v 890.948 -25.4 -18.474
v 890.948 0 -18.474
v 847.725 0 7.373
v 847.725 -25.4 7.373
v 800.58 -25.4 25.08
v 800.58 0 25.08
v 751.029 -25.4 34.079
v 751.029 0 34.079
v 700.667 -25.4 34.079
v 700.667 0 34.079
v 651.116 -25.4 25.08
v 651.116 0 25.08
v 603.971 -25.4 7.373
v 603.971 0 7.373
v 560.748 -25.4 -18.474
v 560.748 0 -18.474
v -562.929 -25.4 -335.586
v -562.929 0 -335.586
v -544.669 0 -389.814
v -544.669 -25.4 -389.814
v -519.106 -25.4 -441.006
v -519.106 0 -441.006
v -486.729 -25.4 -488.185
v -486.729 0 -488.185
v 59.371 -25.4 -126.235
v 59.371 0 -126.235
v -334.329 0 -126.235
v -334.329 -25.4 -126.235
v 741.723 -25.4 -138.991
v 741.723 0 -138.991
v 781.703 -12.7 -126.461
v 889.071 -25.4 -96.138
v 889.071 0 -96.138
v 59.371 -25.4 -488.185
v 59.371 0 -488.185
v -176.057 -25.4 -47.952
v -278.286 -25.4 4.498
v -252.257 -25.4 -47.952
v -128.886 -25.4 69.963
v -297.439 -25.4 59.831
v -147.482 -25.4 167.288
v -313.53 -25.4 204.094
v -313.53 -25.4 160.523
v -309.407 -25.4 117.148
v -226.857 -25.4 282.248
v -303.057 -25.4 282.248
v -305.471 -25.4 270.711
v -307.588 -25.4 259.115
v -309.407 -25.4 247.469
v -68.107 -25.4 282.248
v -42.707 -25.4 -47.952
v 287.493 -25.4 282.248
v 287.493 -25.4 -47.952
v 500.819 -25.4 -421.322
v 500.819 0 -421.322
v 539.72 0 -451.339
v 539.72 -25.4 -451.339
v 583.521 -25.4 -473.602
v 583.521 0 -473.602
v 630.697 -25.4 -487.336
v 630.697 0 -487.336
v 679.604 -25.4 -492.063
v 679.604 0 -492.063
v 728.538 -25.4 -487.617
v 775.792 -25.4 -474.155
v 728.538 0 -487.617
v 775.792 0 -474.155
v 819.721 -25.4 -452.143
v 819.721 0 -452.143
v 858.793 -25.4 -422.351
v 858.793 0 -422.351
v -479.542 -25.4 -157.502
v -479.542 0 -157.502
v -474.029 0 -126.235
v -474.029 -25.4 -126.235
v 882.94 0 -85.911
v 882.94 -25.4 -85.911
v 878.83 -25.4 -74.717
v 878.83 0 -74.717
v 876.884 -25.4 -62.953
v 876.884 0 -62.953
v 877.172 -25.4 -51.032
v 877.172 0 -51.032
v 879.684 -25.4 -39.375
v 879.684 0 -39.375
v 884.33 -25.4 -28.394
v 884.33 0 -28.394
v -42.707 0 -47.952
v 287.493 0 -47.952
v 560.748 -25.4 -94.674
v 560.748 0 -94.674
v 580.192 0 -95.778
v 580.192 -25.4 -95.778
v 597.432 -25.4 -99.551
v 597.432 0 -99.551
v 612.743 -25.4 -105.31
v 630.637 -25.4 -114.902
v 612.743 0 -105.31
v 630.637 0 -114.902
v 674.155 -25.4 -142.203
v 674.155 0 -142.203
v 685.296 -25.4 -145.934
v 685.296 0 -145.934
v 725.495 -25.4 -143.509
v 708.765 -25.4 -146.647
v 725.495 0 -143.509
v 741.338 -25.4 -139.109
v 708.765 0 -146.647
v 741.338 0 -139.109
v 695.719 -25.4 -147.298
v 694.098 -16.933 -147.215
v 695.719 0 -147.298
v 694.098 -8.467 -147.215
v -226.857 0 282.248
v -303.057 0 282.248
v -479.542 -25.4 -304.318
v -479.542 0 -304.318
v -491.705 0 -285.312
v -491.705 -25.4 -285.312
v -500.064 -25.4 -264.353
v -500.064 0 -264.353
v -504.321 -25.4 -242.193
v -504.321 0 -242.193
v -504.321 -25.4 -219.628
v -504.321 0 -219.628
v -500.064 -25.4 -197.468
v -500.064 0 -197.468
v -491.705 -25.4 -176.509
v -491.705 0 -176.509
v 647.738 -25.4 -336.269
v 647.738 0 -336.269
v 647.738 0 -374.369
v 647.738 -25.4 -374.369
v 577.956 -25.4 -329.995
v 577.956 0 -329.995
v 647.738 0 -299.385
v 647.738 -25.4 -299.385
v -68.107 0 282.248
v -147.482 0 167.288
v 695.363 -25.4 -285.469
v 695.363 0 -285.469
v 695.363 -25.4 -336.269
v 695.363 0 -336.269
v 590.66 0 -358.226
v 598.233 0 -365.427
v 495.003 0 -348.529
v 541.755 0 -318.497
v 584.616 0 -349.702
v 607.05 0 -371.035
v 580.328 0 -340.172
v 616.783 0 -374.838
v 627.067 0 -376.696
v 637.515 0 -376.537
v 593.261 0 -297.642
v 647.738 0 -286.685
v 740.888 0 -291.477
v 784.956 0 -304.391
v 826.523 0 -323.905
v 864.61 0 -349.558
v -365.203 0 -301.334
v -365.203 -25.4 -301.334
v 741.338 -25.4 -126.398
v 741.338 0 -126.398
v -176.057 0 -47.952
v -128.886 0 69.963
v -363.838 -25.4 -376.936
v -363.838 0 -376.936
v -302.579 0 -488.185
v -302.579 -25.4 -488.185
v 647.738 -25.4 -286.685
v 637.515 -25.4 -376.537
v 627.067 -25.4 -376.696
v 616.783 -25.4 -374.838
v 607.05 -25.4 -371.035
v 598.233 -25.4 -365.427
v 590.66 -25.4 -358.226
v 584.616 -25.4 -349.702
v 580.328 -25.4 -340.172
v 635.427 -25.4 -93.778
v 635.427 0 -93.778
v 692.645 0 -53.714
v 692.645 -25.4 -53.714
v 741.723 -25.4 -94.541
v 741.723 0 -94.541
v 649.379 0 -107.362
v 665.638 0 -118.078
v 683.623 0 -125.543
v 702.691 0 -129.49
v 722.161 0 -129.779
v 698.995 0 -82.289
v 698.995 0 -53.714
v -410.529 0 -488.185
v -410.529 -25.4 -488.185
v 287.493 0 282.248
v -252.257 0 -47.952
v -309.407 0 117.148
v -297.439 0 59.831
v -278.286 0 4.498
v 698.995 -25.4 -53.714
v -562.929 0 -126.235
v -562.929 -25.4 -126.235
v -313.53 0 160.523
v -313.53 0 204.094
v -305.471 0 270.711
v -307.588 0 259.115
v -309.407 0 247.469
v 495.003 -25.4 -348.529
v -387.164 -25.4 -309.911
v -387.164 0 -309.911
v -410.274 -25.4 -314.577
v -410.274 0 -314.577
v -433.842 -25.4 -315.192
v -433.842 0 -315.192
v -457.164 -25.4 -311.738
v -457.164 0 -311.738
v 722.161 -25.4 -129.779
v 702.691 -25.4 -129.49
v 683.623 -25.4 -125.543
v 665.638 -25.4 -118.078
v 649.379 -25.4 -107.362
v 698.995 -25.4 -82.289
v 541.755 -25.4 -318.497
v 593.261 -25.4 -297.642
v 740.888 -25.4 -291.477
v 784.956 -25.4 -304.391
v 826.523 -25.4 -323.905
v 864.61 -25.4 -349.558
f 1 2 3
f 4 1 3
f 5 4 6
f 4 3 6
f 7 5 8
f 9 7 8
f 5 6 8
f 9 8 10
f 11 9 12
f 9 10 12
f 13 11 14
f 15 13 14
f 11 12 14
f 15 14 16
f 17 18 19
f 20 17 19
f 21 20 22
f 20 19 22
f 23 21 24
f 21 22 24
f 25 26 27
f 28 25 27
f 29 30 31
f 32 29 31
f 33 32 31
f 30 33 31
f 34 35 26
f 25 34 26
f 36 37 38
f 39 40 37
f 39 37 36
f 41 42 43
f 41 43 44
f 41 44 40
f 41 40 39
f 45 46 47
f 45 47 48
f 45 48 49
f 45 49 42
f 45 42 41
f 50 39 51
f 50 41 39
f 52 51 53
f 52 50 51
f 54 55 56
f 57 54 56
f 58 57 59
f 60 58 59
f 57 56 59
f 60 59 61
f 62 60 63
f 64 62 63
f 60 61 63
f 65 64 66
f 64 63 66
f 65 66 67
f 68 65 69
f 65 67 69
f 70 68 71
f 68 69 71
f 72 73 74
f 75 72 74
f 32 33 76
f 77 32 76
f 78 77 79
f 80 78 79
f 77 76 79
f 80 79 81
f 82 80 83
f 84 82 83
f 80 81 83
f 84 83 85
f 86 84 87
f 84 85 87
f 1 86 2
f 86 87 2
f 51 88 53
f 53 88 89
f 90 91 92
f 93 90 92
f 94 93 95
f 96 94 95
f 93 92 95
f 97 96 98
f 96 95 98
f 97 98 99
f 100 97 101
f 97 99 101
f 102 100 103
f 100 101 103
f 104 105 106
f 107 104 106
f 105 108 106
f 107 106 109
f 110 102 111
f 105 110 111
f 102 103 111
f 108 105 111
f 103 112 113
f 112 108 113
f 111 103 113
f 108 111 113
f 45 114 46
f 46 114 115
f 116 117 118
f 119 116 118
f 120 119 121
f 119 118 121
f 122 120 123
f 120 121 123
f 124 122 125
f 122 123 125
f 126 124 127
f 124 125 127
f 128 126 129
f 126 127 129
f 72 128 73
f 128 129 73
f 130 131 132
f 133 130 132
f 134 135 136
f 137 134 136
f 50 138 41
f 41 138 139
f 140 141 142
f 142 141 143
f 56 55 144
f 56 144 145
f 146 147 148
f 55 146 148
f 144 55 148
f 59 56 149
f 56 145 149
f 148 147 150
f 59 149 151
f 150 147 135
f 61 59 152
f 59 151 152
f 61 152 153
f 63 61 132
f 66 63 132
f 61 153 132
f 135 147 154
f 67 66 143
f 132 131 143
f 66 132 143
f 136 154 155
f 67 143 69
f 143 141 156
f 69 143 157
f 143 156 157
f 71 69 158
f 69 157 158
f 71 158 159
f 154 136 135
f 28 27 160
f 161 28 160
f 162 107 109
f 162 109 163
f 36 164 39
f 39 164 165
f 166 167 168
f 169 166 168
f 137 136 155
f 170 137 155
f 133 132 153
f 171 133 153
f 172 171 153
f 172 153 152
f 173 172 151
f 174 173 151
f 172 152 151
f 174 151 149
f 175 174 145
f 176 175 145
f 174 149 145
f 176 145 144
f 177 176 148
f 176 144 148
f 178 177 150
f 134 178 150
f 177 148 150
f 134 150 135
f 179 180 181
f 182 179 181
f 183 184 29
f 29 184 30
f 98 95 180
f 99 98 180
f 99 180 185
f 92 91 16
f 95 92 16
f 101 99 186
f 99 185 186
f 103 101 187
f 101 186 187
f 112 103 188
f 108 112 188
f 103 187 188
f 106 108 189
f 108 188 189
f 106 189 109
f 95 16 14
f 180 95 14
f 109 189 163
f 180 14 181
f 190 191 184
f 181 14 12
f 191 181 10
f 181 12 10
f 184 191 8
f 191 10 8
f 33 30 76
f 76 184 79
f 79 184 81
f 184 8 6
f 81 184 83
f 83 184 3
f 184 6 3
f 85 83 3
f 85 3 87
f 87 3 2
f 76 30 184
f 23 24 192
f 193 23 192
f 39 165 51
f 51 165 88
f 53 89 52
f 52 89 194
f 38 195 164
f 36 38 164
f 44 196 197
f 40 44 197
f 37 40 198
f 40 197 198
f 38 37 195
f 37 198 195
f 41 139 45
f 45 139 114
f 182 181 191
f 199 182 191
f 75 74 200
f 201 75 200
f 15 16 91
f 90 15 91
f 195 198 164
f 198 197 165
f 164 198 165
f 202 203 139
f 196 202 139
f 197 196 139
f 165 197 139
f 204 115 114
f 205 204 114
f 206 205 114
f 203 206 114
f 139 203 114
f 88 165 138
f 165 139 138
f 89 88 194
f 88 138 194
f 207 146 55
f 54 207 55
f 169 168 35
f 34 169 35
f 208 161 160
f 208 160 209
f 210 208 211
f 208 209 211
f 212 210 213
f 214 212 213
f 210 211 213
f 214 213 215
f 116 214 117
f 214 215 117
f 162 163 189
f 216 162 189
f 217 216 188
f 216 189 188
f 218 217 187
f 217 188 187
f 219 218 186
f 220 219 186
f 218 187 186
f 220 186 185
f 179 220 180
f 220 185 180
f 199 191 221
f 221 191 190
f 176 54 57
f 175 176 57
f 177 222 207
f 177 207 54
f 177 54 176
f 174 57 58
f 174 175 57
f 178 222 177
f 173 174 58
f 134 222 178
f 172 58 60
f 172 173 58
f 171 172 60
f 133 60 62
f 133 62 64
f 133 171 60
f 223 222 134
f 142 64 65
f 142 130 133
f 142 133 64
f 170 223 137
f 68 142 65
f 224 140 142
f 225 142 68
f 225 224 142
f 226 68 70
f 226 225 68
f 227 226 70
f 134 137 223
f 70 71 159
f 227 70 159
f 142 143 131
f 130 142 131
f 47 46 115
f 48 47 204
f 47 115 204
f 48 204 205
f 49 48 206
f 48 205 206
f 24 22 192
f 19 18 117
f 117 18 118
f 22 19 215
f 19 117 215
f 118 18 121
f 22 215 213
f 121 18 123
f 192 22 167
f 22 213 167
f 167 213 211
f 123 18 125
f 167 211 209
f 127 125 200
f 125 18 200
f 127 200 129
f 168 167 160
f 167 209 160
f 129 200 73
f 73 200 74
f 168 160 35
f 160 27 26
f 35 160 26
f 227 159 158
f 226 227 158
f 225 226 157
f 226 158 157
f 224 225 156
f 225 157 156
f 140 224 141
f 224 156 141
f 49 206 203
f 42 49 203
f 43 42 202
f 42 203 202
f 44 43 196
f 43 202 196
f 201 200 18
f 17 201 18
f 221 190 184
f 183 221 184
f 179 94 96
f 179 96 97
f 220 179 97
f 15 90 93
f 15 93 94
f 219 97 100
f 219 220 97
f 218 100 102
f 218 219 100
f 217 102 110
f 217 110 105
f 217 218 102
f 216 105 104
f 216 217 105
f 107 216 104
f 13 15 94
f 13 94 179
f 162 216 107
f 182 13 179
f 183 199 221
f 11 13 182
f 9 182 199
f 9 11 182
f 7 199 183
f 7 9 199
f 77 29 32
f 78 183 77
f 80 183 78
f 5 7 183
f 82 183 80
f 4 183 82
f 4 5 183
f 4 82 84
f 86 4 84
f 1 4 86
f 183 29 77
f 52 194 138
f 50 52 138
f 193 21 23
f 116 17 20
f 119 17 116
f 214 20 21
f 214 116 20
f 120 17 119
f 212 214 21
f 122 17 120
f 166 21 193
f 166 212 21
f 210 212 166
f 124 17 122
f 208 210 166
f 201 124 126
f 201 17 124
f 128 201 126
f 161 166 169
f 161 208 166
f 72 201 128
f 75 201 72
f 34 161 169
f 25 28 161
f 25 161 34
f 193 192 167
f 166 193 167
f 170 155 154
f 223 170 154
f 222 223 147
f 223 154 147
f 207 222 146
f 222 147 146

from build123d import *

# Parameters (mm, degrees)
F1_DEPTH = 25.4
F3_DEPTH = 25.4
F5_DEPTH = 25.4
F7_DEPTH = 25.4


with BuildPart() as f1:
    # F0 (on Front) → F1 (new body)
    with BuildSketch(Plane.XZ):
        with BuildLine():
            Line((-226.8574877262, 282.2478941011), (-303.0574877262, 282.2478941011))
            ThreePointArc((-303.0574877262, 282.2478941011), (-306.5667724299, 264.9196984604), (-309.4074877262, 247.4694325626))
            Line((-309.4074877262, 247.4694325626), (-309.4074877262, 117.1478941011))
            ThreePointArc((-309.4074877262, 117.1478941011), (-288.7438958182, 31.8593297616), (-252.2574877262, -47.9521058989))
            Line((-252.2574877262, -47.9521058989), (-176.0574877262, -47.9521058989))
            Line((-176.0574877262, -47.9521058989), (-128.8860591548, 69.9625086598))
            Line((-128.8860591548, 69.9625086598), (-42.7074877262, -47.9521058989))
            Line((-42.7074877262, -47.9521058989), (287.4925122738, -47.9521058989))
            Line((287.4925122738, -47.9521058989), (287.4925122738, 282.2478941011))
            Line((287.4925122738, 282.2478941011), (-68.1074877262, 282.2478941011))
            Line((-68.1074877262, 282.2478941011), (-147.4824877262, 167.2883387132))
            Line((-147.4824877262, 167.2883387132), (-226.8574877262, 282.2478941011))
        make_face()
        with BuildLine():
            Line((-309.4074877262, 117.1478941011), (-309.4074877262, 247.4694325626))
            ThreePointArc((-309.4074877262, 247.4694325626), (-314.0466817929, 182.3086633319), (-309.4074877262, 117.1478941011))
        make_face()
    extrude(amount=F1_DEPTH)


with BuildPart() as f3:
    # F2 (on Front) → F3 (new body)
    with BuildSketch(Plane.XZ):
        with BuildLine():
            Line((-474.0288363537, -126.2347238485), (-562.9288363537, -126.2347238485))
            Line((-562.9288363537, -126.2347238485), (-562.9288363537, -335.5858655814))
            ThreePointArc((-562.9288363537, -335.5858655814), (-532.7732824419, -415.8523413809), (-486.7288363537, -488.1847238485))
            Line((-486.7288363537, -488.1847238485), (-410.5288363537, -488.1847238485))
            Line((-410.5288363537, -488.1847238485), (-363.8376598831, -376.9356495162))
            Line((-363.8376598831, -376.9356495162), (-302.5788363537, -488.1847238485))
            Line((-302.5788363537, -488.1847238485), (59.3711636463, -488.1847238485))
            Line((59.3711636463, -488.1847238485), (59.3711636463, -126.2347238485))
            Line((59.3711636463, -126.2347238485), (-334.3288363537, -126.2347238485))
            Line((-334.3288363537, -126.2347238485), (-365.2034823429, -301.3335423341))
            ThreePointArc((-365.2034823429, -301.3335423341), (-422.0447358567, -315.3944719189), (-479.5421659946, -304.3182194233))
            ThreePointArc((-479.5421659946, -304.3182194233), (-504.8561307828, -230.910294715), (-479.5421659946, -157.5023700066))
            Line((-479.5421659946, -157.5023700066), (-474.0288363537, -126.2347238485))
        make_face()
    extrude(amount=F3_DEPTH)


with BuildPart() as f5:
    # F4 (on Front) → F5 (new body)
    with BuildSketch(Plane.XZ):
        with BuildLine():
            ThreePointArc((890.948049928, -18.4742202407), (725.848049928, 35.2107173548), (560.748049928, -18.4742202407))
            Line((560.748049928, -18.4742202407), (890.948049928, -18.4742202407))
        make_face()
        with BuildLine():
            Line((890.948049928, -18.4742202407), (560.748049928, -18.4742202407))
            Line((560.748049928, -18.4742202407), (560.748049928, -94.6742202407))
            add(Edge.make_bspline(
                [(560.748049928, -94.6742202407), (601.1304439834, -93.7782313596), (646.3805642348, -125.5473149903), (687.975454314, -153.5676392723), (726.9119481945, -143.5394538796), (741.3378953524, -139.1094826053)],
                knots=[0, 0, 0, 0, 0.2658070371, 0.4603208353, 0.6276610129, 0.6276610129, 0.6276610129, 0.6276610129], degree=3))
            Line((741.3378953524, -139.1094826053), (741.3378953524, -126.3980430136))
            ThreePointArc((741.3378953524, -126.3980430136), (683.622552597, -125.5429859615), (635.42719725, -93.7782313596))
            Line((635.42719725, -93.7782313596), (692.6449675436, -53.7139172805))
            Line((692.6449675436, -53.7139172805), (698.9949675436, -53.7139172805))
            Line((698.9949675436, -53.7139172805), (698.9949675436, -82.2889172805))
            Line((698.9949675436, -82.2889172805), (741.723049928, -94.5409977465))
            Line((741.723049928, -94.5409977465), (741.723049928, -126.2909977465))
            Line((741.723049928, -126.2909977465), (741.723049928, -138.9909977465))
            add(Edge.make_bspline(
                [(741.723049928, -138.9909977465), (745.3286248944, -137.8798650124), (775.1299197445, -128.2160469879), (778.6921623391, -126.9860638749), (889.0712335415, -96.1381000441)],
                knots=[0.6291535927, 0.6291535927, 0.6291535927, 0.6291535927, 0.6711656331, 1, 1, 1, 1], degree=3))
            ThreePointArc((889.0712335415, -96.1381000441), (876.7474646635, -56.9856678967), (890.948049928, -18.4742202407))
        make_face()
    extrude(amount=F5_DEPTH)


with BuildPart() as f7:
    # F6 (on Front) → F7 (new body)
    with BuildSketch(Plane.XZ):
        with BuildLine():
            ThreePointArc((647.7376957216, -286.6853071554), (567.0221836557, -306.8691734898), (495.0025209049, -348.5291125864))
            Line((495.0025209049, -348.5291125864), (500.8192232756, -421.3220833908))
            ThreePointArc((500.8192232756, -421.3220833908), (679.6042404484, -492.0629554948), (858.7930130333, -422.3511406348))
            Line((858.7930130333, -422.3511406348), (864.609715404, -349.5581698304))
            ThreePointArc((864.609715404, -349.5581698304), (784.9555511077, -304.3905678126), (695.3626957216, -285.4691929806))
            Line((695.3626957216, -285.4691929806), (695.3626957216, -336.2691929806))
            Line((695.3626957216, -336.2691929806), (647.7376957216, -336.2691929806))
            Line((647.7376957216, -336.2691929806), (647.7376957216, -374.3691929806))
            ThreePointArc((647.7376957216, -374.3691929806), (602.5055129428, -368.4448121137), (577.9560709508, -329.9951886373))
            Line((577.9560709508, -329.9951886373), (647.7376957216, -299.3853071554))
            Line((647.7376957216, -299.3853071554), (647.7376957216, -286.6853071554))
        make_face()
    extrude(amount=F7_DEPTH)


solid = Compound([f1.part, f3.part, f5.part, f7.part])
